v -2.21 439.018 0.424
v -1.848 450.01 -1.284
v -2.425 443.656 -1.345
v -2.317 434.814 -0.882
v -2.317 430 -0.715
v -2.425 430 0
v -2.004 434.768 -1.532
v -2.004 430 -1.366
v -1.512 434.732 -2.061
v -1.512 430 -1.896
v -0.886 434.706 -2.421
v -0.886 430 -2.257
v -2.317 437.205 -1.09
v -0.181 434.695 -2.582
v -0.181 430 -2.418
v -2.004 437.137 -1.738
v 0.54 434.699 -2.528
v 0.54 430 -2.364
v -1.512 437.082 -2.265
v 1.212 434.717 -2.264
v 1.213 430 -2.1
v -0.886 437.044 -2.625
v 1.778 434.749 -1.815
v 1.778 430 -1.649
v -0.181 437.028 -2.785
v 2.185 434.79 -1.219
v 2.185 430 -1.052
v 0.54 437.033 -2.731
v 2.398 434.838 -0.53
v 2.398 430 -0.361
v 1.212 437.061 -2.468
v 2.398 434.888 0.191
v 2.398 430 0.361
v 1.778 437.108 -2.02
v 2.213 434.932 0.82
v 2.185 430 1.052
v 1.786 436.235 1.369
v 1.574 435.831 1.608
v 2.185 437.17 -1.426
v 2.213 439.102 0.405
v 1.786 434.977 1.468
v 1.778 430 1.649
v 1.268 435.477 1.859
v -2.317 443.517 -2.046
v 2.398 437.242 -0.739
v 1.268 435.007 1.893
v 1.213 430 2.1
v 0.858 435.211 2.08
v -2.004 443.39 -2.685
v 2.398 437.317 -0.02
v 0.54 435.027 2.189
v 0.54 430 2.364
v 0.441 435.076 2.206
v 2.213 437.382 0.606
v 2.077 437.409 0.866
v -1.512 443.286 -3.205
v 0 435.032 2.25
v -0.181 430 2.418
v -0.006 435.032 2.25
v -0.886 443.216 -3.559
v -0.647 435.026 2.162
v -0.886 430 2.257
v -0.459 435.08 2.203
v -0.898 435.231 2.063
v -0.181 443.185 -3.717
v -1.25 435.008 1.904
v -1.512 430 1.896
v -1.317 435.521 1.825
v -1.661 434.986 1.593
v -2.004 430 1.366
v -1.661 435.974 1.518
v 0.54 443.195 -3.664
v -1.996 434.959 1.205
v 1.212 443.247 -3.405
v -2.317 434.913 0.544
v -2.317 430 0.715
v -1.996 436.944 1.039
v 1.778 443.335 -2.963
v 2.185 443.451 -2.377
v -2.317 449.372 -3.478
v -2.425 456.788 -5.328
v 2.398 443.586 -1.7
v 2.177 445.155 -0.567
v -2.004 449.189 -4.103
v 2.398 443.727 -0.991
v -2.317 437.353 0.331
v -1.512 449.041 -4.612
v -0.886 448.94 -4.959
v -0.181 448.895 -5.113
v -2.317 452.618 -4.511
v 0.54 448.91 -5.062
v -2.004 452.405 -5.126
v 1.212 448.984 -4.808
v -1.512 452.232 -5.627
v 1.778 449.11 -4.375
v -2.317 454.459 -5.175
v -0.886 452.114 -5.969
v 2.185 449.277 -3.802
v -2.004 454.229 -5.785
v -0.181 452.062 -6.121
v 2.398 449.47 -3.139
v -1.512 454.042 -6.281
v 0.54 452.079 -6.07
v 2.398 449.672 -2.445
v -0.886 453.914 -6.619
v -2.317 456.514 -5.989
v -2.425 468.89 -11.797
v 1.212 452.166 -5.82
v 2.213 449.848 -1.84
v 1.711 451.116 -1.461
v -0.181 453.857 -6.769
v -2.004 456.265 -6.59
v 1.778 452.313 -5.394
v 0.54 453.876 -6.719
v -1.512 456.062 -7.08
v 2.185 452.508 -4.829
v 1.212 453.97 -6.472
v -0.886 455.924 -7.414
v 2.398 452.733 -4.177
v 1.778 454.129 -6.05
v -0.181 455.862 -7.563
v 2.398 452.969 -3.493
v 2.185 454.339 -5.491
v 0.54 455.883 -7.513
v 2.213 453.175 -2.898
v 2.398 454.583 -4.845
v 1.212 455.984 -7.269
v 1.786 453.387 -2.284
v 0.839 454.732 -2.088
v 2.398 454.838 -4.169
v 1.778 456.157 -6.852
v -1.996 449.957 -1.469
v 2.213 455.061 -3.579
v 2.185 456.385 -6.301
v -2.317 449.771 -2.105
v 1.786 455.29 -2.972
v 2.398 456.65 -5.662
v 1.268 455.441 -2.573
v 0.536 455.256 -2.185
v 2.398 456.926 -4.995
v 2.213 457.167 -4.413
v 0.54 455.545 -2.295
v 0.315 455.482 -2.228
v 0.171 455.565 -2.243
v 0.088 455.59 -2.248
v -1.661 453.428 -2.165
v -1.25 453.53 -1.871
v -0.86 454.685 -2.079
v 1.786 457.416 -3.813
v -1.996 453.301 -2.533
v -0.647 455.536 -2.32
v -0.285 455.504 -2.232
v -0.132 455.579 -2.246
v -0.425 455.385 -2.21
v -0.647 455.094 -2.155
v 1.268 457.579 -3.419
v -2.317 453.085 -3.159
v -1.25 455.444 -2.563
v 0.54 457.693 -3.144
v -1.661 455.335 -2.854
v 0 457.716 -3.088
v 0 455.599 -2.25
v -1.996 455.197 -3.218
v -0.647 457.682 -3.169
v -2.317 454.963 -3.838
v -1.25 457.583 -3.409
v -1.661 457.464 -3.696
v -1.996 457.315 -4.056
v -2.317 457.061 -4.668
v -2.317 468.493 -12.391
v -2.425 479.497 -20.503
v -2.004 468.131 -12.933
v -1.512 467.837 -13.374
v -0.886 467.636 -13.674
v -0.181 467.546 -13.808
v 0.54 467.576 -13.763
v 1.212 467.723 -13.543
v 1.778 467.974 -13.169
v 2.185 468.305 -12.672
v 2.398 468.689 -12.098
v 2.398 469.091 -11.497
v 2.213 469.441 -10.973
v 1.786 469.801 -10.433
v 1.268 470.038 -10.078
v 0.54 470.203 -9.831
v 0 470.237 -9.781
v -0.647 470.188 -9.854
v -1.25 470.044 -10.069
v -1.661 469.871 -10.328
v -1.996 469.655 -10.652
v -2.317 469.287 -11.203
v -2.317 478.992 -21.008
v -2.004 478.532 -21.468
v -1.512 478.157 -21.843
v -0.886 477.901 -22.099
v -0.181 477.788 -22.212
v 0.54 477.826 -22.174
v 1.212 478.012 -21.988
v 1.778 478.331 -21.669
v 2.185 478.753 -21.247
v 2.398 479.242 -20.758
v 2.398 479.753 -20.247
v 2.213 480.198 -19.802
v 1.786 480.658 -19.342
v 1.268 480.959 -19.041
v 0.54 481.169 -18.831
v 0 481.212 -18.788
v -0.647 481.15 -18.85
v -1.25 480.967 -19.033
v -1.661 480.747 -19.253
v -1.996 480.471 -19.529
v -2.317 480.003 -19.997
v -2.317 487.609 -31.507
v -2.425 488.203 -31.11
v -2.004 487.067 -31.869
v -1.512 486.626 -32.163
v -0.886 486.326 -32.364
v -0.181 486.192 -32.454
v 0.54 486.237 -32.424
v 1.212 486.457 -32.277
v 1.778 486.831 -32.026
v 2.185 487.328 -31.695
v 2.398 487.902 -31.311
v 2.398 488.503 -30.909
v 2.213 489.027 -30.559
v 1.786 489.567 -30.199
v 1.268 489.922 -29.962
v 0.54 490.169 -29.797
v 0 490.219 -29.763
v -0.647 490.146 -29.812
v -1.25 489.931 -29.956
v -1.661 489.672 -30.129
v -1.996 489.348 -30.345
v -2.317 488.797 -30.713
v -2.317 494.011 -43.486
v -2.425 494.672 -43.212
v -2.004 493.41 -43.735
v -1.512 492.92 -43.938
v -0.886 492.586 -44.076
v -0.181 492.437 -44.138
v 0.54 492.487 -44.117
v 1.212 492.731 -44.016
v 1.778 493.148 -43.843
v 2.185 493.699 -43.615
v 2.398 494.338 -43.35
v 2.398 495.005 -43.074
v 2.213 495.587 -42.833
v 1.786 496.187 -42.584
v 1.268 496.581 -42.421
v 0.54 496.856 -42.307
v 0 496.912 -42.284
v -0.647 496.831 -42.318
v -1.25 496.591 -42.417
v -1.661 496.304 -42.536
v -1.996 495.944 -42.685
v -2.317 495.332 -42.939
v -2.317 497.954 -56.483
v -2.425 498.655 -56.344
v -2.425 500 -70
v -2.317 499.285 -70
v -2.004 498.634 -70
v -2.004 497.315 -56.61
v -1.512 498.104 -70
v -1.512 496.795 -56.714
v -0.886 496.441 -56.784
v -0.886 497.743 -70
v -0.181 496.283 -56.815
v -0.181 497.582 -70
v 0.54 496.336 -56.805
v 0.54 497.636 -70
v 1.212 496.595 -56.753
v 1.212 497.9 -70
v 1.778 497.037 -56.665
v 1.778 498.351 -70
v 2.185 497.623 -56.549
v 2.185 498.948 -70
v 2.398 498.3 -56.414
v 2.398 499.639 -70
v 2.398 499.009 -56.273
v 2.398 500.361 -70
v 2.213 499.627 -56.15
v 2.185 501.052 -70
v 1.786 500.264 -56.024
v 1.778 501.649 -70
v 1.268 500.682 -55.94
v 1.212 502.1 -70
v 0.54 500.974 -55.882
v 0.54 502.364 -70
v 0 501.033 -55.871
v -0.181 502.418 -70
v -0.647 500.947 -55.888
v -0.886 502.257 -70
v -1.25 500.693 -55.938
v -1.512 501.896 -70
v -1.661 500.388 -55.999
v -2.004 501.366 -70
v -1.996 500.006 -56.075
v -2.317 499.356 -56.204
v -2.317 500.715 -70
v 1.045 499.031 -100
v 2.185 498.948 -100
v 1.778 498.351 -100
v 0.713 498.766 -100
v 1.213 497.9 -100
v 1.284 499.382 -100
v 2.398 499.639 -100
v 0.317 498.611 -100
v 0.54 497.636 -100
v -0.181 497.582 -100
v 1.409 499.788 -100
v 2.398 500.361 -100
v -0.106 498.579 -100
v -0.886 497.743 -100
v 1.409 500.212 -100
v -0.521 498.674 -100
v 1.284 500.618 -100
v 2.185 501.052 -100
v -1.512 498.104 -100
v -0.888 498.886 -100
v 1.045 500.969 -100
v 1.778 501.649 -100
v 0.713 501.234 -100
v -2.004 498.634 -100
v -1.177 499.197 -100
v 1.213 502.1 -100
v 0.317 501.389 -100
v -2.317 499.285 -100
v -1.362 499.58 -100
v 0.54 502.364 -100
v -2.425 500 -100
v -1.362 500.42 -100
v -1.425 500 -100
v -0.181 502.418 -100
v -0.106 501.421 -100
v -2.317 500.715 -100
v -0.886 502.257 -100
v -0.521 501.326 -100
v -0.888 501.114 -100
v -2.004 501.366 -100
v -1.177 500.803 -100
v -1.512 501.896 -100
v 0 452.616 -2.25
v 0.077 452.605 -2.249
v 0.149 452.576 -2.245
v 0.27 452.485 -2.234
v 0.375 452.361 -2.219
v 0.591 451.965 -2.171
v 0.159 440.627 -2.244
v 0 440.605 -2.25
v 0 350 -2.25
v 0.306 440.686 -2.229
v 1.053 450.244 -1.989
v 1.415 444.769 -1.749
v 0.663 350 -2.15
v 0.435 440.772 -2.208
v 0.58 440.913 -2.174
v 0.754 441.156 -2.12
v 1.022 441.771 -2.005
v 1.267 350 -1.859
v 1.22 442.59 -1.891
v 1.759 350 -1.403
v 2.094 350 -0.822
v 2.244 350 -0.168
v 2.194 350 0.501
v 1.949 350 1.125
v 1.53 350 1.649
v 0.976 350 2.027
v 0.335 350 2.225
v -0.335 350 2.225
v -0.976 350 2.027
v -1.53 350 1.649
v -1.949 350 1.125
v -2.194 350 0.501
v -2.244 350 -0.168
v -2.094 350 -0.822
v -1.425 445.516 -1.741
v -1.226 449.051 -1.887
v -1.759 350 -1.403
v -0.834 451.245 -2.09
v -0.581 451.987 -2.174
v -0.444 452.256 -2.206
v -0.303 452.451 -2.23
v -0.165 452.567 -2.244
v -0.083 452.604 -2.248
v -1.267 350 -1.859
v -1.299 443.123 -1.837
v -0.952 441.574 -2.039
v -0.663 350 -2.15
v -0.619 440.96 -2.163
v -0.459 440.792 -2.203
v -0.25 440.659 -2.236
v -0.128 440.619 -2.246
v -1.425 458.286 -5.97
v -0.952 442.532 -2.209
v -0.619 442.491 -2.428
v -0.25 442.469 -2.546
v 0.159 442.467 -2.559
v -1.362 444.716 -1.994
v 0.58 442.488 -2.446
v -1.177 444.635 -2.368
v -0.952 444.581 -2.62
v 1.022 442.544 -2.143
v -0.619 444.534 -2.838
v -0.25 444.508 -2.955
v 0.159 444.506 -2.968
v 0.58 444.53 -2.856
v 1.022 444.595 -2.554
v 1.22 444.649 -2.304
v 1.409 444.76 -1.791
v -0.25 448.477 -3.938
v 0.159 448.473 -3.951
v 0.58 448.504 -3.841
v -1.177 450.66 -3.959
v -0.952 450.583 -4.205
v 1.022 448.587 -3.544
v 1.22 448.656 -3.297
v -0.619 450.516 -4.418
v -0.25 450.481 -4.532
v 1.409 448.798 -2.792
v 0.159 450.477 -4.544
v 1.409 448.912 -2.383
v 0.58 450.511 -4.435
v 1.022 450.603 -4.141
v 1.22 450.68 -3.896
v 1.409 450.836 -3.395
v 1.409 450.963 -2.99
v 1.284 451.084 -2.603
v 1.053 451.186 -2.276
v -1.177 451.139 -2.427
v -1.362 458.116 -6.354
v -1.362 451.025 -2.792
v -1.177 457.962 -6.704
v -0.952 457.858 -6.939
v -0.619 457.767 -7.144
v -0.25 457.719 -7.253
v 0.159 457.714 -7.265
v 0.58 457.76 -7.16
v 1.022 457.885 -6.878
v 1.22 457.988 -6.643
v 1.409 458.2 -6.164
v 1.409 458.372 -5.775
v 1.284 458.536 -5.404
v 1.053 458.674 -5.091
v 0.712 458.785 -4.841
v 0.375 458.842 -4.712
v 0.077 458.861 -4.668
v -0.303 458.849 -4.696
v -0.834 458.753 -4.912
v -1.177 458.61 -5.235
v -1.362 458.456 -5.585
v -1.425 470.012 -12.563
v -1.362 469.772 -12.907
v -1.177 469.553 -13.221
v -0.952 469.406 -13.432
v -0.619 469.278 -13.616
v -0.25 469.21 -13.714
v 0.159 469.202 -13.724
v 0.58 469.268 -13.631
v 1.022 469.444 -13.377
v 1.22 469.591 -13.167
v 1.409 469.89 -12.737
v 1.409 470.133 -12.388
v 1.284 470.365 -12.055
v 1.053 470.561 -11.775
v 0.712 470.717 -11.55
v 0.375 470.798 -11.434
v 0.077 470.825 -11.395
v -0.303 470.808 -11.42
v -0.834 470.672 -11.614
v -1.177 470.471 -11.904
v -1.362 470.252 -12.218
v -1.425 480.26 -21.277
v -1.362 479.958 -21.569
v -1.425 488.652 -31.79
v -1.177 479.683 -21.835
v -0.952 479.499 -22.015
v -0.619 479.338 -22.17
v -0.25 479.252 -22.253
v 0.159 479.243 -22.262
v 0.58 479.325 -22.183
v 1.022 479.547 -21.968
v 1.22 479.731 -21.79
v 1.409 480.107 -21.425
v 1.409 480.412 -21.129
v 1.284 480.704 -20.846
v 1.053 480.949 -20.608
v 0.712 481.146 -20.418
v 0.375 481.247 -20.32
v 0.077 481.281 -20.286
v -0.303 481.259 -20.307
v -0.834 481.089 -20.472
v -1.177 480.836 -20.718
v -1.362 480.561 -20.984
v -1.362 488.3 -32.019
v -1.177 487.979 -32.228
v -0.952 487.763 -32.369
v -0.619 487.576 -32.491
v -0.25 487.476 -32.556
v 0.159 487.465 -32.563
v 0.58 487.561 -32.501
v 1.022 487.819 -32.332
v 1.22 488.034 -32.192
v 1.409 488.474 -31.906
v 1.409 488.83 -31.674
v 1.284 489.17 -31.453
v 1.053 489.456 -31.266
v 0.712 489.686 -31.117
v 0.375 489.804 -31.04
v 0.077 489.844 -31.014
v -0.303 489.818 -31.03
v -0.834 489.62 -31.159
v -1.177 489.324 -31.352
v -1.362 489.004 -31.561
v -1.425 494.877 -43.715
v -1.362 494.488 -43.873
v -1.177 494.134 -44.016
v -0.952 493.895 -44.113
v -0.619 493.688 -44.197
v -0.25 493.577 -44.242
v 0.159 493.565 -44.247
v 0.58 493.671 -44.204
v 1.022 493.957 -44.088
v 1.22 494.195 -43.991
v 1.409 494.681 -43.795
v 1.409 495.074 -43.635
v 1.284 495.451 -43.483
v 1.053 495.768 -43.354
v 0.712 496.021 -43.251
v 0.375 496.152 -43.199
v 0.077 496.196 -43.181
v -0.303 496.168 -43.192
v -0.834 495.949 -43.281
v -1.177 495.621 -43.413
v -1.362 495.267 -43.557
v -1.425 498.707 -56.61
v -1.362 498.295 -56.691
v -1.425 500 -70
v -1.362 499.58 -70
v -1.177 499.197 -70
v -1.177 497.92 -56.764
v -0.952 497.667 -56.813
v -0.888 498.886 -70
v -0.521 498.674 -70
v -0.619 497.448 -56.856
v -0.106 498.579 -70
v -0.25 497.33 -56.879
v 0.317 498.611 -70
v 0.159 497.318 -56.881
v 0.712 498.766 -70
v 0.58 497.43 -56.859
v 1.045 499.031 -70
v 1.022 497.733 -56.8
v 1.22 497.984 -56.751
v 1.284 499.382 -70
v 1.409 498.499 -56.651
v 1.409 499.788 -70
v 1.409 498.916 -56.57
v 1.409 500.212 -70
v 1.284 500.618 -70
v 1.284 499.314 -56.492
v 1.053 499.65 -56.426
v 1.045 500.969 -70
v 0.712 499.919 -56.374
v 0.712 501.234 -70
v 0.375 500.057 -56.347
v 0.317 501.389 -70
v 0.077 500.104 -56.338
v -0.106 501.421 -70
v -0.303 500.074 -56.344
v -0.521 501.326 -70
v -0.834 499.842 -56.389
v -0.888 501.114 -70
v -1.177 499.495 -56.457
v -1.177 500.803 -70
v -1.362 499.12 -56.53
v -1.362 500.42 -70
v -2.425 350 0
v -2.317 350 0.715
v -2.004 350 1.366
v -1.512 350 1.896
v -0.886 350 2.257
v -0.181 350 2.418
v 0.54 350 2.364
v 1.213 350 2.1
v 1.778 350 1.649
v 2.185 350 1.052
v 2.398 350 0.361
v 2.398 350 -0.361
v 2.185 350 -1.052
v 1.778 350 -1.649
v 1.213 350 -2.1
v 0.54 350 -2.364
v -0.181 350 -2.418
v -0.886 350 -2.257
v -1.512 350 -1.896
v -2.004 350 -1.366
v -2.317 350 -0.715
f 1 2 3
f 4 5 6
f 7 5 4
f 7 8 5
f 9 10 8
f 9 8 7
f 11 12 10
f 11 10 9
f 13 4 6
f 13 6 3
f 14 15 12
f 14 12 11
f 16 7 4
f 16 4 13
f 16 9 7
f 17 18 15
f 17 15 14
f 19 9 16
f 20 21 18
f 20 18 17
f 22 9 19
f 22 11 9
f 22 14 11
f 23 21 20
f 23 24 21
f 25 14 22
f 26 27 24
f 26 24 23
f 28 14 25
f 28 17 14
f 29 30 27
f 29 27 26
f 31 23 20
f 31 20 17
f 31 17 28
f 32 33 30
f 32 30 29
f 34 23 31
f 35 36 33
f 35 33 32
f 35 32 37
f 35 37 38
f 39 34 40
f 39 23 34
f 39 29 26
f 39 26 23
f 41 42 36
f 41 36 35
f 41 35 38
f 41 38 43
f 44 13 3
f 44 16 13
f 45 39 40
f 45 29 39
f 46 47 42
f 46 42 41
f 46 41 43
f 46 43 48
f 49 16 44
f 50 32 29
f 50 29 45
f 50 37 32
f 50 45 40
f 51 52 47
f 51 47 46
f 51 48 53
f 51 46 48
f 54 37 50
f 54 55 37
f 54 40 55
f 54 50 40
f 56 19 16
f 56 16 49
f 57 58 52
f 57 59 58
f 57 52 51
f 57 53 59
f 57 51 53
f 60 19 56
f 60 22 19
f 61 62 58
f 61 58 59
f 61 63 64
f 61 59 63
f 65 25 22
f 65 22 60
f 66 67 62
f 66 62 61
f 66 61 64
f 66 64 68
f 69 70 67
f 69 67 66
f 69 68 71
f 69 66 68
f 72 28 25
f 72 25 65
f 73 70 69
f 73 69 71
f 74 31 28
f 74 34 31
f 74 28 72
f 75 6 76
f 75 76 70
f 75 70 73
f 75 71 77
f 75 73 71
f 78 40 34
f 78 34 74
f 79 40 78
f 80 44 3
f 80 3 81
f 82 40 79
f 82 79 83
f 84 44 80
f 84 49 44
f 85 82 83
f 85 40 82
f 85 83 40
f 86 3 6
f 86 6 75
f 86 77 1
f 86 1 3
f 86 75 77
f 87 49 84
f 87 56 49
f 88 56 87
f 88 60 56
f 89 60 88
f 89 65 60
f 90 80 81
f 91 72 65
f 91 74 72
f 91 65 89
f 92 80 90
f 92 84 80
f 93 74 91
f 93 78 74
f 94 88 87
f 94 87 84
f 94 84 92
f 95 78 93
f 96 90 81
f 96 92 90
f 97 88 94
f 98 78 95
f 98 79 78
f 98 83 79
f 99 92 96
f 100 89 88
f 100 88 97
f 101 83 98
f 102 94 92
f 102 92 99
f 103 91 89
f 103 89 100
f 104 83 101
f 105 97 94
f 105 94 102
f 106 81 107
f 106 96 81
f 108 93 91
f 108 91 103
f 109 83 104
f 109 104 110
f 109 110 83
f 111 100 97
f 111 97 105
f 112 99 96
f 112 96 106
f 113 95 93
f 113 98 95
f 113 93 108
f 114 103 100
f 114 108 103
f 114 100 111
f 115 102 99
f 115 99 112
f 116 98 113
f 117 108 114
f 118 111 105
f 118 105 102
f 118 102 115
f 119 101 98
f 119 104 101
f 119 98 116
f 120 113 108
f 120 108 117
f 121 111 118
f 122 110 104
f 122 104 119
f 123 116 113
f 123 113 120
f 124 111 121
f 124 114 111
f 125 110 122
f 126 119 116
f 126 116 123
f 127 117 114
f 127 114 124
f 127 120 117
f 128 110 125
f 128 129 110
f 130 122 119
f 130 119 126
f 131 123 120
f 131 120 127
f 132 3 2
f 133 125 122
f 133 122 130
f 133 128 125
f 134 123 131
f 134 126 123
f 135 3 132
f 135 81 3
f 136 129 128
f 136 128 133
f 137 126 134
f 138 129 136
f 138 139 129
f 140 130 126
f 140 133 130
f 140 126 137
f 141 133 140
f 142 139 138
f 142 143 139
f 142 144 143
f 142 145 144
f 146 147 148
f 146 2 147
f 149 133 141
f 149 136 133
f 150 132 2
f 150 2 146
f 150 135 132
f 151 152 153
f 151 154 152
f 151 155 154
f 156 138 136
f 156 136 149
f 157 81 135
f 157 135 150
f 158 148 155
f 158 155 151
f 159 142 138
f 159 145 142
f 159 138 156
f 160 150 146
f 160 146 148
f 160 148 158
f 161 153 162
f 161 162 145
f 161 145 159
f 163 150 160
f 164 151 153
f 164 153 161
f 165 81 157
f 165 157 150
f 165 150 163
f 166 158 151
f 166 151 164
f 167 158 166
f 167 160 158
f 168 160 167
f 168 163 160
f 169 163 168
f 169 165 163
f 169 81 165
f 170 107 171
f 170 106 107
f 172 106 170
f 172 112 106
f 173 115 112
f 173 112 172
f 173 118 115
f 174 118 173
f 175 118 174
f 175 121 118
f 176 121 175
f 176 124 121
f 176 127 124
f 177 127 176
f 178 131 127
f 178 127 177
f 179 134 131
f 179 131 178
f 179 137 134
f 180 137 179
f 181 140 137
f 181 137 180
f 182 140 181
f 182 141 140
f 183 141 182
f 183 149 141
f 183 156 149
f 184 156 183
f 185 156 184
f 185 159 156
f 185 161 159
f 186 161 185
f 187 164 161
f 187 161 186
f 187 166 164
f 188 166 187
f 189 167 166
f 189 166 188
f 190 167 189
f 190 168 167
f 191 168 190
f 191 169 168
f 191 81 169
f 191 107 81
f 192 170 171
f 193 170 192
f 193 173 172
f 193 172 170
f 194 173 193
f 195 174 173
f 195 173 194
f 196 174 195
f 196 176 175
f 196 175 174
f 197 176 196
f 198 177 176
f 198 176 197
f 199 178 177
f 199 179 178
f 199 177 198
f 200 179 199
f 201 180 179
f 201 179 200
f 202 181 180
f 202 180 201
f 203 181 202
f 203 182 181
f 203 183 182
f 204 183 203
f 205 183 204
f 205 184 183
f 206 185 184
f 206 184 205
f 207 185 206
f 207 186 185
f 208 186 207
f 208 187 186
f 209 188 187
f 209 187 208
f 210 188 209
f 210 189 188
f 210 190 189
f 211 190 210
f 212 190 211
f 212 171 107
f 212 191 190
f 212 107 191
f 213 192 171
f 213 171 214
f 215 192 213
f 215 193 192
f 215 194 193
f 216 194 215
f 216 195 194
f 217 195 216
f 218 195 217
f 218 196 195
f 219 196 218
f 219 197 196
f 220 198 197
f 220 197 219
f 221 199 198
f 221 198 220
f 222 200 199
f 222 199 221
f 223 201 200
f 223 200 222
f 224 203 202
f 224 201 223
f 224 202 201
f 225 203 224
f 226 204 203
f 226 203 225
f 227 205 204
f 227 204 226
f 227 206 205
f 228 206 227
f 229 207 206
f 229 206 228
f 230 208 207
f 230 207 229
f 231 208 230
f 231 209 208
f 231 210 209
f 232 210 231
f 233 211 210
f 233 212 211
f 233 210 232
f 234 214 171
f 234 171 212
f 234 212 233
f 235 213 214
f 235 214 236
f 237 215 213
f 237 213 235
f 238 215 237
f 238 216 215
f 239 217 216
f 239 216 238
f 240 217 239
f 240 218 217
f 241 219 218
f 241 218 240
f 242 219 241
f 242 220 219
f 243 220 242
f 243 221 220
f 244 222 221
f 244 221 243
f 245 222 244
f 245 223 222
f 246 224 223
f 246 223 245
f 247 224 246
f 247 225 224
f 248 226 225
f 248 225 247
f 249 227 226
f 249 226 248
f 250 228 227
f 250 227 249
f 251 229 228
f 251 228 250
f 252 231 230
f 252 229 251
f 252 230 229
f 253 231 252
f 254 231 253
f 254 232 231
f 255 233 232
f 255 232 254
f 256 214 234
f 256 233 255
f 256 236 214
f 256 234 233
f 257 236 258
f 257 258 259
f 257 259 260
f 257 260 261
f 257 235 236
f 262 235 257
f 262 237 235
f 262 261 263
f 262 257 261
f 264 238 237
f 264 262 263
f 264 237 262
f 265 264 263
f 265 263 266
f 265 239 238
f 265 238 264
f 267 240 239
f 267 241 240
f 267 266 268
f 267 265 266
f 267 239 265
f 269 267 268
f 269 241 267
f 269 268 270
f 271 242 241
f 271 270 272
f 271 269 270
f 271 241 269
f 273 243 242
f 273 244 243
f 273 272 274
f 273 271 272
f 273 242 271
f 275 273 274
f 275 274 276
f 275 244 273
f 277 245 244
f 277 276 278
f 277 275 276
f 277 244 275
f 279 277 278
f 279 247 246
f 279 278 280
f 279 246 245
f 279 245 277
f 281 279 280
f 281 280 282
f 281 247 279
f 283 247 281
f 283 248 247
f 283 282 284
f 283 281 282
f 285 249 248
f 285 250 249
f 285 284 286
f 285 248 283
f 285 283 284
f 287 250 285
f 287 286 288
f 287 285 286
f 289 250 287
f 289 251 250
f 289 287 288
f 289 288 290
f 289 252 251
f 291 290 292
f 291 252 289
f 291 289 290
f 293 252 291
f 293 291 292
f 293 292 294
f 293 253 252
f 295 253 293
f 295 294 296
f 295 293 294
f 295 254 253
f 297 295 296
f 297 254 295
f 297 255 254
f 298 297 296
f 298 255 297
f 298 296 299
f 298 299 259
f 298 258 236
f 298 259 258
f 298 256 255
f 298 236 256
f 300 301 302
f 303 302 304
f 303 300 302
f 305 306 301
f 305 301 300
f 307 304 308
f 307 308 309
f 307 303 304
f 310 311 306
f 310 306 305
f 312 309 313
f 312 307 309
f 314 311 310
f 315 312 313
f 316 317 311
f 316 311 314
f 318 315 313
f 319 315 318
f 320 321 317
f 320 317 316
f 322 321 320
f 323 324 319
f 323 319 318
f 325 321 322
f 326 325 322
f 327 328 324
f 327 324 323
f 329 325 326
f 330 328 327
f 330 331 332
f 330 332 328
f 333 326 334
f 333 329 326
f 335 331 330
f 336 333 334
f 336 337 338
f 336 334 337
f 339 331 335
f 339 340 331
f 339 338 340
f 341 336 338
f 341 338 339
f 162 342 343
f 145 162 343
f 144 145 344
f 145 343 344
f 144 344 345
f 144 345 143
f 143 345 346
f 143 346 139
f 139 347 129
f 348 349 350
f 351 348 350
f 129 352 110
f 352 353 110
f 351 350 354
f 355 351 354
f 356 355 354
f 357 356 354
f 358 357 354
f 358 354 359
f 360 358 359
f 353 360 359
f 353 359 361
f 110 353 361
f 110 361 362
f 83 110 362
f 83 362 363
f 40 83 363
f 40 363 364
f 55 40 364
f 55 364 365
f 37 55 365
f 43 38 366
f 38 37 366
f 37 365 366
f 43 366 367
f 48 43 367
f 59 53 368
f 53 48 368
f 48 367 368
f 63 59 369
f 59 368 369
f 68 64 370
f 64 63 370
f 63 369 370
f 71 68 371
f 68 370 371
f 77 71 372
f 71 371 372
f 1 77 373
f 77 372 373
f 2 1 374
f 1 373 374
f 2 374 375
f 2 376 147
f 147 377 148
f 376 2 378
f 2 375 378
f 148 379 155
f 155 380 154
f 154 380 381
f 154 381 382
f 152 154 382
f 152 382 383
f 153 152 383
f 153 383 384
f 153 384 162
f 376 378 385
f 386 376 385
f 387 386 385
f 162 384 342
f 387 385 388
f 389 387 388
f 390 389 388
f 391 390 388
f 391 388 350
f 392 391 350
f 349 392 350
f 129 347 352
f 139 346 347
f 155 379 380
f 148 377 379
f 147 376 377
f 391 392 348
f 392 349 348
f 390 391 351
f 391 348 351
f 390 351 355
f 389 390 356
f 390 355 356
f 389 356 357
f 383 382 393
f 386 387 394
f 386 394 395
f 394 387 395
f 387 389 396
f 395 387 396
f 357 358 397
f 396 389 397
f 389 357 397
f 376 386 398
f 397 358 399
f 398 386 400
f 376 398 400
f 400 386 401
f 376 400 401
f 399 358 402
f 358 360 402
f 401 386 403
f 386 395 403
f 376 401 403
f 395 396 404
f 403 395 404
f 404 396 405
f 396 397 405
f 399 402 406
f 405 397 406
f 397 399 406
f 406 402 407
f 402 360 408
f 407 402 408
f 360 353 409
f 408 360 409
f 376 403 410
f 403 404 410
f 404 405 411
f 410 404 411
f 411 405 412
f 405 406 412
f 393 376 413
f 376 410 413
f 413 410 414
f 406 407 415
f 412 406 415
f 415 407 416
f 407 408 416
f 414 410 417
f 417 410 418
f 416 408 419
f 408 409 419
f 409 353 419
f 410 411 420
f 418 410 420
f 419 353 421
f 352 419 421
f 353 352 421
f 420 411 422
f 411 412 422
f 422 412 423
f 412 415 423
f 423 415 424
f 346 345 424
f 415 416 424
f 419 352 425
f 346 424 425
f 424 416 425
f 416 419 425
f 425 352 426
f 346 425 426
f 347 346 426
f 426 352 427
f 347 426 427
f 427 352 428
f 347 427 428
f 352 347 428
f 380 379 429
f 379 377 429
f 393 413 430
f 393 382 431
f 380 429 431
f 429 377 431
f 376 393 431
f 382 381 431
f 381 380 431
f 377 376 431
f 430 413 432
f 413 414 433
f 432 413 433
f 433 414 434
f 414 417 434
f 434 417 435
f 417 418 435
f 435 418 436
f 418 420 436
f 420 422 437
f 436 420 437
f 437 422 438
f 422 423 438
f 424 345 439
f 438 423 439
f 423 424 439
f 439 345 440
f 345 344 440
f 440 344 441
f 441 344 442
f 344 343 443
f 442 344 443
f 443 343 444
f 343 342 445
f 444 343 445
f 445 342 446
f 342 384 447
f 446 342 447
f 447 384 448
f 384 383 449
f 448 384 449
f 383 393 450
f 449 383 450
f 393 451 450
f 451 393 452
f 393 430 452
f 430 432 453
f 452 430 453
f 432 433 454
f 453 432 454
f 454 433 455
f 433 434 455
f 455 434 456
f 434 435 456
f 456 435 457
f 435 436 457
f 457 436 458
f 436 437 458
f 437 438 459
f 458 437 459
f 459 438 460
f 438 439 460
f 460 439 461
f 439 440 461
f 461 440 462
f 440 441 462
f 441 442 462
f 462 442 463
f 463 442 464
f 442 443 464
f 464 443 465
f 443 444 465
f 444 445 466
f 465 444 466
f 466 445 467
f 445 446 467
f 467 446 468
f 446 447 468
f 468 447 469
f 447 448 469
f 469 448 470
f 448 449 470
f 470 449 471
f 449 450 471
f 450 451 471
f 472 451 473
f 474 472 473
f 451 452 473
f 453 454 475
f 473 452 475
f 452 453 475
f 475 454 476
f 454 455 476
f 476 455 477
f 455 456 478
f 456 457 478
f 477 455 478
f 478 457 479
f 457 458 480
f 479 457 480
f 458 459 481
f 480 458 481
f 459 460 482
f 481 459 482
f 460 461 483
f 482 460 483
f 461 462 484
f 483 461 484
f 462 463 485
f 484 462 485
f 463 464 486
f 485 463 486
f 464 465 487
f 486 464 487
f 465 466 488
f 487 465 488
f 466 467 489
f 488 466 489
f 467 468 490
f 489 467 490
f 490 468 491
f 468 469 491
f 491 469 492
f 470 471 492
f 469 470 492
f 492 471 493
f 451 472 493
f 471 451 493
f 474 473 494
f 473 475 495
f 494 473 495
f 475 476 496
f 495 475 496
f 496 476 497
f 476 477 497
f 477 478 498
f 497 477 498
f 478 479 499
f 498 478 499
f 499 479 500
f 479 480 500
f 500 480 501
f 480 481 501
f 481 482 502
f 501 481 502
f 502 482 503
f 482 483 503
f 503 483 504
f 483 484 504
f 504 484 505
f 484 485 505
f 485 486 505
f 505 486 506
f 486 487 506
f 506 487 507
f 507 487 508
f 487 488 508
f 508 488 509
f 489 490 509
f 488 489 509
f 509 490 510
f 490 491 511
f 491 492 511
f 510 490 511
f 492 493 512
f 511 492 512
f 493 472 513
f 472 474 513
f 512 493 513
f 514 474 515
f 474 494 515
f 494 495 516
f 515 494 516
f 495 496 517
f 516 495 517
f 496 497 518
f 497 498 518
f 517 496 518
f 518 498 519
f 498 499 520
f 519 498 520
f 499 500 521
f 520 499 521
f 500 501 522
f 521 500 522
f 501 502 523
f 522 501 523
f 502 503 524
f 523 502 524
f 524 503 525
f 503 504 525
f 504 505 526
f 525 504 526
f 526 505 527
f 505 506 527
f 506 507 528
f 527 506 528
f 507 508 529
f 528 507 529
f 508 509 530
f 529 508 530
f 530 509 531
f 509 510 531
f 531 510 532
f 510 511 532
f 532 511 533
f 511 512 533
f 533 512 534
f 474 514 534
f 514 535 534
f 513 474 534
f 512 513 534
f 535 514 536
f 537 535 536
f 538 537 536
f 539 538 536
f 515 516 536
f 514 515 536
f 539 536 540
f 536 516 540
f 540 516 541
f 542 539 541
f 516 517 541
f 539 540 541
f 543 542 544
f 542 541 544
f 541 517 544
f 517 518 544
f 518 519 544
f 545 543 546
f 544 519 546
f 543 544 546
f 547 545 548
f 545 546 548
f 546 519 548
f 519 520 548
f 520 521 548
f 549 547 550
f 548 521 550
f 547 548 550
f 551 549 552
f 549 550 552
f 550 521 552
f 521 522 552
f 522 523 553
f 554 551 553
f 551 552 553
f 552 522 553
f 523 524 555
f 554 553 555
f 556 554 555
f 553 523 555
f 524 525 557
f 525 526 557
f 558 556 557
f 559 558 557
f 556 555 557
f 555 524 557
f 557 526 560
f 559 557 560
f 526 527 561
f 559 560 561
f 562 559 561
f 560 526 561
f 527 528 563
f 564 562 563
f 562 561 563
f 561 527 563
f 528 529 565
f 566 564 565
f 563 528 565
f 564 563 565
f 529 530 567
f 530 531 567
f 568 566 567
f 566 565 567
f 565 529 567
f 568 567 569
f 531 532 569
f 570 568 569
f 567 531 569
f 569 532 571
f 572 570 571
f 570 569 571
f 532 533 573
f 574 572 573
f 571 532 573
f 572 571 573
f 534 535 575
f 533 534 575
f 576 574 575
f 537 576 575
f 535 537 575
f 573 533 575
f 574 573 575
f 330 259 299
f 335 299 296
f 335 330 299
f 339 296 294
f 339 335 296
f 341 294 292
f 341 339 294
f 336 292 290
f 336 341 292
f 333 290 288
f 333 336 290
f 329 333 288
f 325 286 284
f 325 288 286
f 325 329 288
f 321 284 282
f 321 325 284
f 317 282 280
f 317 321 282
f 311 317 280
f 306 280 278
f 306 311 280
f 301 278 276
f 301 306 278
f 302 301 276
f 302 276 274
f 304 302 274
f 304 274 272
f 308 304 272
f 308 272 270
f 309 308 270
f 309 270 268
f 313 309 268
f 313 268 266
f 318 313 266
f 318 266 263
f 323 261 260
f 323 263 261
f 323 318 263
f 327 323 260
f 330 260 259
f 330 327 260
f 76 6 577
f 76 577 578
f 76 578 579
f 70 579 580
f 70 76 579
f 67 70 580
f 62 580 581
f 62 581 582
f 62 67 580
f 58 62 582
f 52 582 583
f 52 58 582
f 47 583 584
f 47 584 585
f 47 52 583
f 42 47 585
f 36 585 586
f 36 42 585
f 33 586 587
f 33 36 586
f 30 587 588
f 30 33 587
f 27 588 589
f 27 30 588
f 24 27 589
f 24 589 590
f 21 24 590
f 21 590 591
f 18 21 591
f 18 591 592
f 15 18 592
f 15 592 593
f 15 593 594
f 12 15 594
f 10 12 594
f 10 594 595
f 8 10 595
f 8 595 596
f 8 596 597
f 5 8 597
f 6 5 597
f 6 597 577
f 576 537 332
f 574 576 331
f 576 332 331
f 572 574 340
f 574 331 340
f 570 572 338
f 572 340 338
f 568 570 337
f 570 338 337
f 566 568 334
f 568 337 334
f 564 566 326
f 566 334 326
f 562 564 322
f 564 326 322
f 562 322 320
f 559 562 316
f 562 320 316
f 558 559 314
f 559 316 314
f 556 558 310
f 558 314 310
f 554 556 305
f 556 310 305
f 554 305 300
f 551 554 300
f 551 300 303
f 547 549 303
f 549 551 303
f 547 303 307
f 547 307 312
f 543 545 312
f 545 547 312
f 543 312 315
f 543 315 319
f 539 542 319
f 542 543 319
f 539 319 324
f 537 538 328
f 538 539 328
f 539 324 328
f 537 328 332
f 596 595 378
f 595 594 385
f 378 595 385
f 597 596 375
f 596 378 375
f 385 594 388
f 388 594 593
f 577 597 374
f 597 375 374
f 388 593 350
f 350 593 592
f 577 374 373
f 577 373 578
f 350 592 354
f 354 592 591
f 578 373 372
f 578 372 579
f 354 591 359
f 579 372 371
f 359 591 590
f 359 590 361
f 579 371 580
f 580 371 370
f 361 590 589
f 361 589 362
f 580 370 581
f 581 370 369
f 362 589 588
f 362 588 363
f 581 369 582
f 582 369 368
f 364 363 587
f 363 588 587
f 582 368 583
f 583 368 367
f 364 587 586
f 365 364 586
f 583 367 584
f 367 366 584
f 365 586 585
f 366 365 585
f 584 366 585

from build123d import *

# Parameters (mm, degrees)
IZIM2_R               = 2.425
BO_ALTMA1_T           = -1
IZIM3_R               = 2.25
KES_EKSTR_ZYON1_DEPTH = 109


with BuildPart() as part:
    # Süpür1: sweep along a path in Çizim1
    with BuildLine(Plane(origin=(0, 0, 0), x_dir=(0, 0, -1), z_dir=(1, 0, 0))) as s_p_r1_path:
        Line((0, 350), (0, 430))
        ThreePointArc((0, 430), (20.502525317, 479.497474683), (70, 500))
        Line((70, 500), (100, 500))
    # Çizim2 → Süpür1 (sweep)
    with BuildSketch(Plane(origin=(0, 500, -100), x_dir=(-1, 0, 0), z_dir=(0, 0, -1))):
        Circle(IZIM2_R)
    sweep(path=s_p_r1_path.line)

    # İç Boşaltma1
    bo_altma1_openings = [part.faces().sort_by_distance(p)[0] for p in [
        (0, 500, -100),
    ]]
    offset(amount=BO_ALTMA1_T, openings=bo_altma1_openings, kind=Kind.INTERSECTION)

    # Çizim3 → Kes-Ekstrüzyon1 (cut)
    with BuildSketch(Plane.XZ.offset(-350)):
        with Locations(Location((0, 0, 0), (0, 0, 270))):
            Circle(IZIM3_R)
    extrude(amount=-KES_EKSTR_ZYON1_DEPTH, mode=Mode.SUBTRACT)


solid = part.part
